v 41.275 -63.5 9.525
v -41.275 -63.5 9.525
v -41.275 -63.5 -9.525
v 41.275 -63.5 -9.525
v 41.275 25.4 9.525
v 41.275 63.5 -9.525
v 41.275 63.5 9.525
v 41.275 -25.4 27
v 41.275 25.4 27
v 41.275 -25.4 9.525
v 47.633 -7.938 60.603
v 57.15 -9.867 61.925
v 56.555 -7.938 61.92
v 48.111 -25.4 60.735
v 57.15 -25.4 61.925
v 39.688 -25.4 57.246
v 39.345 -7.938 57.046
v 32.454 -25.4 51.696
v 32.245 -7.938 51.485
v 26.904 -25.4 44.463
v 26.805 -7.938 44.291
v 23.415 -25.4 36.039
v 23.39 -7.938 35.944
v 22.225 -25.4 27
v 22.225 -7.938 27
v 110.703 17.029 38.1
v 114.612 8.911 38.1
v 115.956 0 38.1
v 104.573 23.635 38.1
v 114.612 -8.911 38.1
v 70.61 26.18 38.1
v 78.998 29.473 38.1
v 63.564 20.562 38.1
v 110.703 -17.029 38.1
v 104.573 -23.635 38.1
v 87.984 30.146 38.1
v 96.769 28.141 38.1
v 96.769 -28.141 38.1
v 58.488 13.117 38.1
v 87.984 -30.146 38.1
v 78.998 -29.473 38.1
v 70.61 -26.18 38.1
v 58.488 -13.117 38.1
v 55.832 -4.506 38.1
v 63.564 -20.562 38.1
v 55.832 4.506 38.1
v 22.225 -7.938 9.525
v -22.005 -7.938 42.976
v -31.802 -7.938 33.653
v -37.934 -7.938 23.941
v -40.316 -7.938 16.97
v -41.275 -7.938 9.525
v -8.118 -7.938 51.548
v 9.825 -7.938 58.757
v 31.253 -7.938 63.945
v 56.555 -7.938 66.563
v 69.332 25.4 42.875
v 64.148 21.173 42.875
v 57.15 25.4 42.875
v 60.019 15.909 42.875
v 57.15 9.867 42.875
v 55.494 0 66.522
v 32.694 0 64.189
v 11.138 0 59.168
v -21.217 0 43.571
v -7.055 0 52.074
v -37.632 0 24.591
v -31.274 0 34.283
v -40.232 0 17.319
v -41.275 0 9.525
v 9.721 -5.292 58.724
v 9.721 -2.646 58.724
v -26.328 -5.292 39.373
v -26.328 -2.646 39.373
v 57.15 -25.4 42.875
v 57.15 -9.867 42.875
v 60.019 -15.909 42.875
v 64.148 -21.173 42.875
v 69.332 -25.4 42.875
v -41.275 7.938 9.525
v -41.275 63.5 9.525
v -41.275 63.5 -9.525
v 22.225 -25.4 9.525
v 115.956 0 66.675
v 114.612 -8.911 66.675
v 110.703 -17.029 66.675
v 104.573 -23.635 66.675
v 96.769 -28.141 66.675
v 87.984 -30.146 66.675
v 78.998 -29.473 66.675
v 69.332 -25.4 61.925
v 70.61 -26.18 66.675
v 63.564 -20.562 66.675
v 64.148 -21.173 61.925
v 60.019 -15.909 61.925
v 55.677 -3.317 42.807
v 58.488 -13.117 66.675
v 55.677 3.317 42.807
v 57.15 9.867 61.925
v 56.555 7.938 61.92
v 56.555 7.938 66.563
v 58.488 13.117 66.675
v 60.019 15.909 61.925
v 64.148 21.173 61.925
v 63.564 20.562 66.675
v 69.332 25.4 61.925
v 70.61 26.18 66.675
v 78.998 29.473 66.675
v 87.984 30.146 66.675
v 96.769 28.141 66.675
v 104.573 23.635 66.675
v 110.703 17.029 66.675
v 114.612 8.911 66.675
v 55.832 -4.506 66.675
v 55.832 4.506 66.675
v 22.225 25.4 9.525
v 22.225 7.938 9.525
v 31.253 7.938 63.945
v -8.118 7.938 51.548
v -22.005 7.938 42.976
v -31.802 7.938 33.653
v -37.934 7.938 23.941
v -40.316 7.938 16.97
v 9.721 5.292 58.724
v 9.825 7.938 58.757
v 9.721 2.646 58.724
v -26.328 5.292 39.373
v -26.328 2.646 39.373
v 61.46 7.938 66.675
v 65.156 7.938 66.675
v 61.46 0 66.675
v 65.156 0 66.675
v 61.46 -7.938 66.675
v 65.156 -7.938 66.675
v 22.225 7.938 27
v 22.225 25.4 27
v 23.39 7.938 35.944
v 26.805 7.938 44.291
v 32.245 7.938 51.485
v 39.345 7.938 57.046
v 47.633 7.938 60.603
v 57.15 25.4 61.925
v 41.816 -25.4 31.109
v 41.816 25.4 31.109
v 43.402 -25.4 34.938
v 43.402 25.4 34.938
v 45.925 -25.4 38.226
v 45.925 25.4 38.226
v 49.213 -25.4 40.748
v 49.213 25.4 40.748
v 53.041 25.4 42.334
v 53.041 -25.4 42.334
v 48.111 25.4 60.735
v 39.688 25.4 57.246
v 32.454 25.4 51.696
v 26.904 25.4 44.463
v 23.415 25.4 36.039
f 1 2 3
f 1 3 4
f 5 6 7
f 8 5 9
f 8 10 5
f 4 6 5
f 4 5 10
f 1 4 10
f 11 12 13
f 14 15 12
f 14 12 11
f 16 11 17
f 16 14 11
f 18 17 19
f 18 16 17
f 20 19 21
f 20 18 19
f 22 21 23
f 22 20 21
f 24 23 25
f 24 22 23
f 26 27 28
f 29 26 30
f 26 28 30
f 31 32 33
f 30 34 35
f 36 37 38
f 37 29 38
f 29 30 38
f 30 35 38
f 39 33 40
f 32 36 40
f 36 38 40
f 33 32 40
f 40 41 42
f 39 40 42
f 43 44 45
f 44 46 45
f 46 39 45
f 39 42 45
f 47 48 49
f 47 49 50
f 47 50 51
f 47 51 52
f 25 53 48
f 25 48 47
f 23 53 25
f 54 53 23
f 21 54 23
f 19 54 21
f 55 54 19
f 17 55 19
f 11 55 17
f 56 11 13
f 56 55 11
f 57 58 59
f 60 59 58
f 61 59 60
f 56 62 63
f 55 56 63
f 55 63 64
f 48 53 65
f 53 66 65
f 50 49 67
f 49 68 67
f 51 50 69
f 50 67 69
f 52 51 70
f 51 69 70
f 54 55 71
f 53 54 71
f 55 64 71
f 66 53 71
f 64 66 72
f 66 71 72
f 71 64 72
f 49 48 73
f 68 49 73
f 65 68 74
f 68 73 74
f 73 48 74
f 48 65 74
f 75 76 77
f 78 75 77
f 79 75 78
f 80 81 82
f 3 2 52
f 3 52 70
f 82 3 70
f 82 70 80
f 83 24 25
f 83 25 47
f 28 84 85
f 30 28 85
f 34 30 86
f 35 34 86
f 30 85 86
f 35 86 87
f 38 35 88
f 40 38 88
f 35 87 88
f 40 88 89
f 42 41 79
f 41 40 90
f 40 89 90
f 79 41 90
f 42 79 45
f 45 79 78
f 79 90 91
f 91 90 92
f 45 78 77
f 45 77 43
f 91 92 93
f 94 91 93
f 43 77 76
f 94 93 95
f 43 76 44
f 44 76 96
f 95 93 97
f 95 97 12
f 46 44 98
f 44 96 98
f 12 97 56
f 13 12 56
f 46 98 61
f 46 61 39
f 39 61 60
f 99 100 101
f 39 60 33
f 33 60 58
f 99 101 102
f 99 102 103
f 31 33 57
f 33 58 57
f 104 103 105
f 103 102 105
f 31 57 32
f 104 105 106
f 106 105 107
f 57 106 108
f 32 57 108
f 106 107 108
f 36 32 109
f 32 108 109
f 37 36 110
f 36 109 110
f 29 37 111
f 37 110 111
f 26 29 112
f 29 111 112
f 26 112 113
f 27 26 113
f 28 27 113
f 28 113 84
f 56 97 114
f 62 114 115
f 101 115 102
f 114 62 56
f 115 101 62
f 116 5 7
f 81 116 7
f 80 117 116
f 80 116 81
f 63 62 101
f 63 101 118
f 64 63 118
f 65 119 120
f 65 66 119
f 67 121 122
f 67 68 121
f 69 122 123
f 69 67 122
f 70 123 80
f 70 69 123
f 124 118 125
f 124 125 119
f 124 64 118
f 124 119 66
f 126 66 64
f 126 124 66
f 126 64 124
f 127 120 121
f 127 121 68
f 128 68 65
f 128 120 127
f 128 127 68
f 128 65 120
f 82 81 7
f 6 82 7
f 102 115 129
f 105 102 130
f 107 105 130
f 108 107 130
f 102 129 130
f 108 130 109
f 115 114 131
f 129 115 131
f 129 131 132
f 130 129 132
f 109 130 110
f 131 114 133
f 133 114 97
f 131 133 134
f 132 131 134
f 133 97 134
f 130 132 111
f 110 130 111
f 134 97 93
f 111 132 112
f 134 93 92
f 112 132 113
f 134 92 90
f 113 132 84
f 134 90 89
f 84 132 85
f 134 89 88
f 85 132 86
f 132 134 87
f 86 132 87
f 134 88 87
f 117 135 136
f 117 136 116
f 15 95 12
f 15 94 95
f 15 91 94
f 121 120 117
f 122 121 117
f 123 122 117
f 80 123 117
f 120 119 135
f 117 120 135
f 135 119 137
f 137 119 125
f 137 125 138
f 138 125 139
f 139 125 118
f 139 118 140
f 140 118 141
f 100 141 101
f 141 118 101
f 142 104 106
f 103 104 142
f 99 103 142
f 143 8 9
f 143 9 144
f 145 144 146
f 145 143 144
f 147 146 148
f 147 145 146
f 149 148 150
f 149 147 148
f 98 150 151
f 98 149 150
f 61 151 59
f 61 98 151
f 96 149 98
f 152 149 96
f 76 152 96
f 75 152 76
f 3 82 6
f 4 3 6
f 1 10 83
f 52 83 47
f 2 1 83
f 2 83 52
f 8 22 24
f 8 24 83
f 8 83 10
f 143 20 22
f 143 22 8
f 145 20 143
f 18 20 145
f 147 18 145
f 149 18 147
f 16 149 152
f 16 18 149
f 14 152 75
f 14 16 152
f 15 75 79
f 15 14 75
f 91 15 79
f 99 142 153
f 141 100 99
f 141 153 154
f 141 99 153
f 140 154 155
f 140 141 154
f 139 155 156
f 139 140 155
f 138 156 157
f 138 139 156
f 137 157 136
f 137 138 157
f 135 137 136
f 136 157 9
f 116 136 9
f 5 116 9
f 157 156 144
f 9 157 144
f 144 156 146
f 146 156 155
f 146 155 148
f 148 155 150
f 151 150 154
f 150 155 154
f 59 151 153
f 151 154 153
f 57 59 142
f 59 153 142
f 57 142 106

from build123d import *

# Parameters (mm, degrees)
F1_DEPTH = 63.5
F0_W     = 20.569474
F0_H     = 19.05
F2_DEPTH = 25.4
F3_DEPTH = 7.9375


with BuildPart() as f1:
    # F0 (on Front) → F1 (new body, symmetric)
    with BuildSketch(Plane.XZ):
        Polygon((22.225, 9.525), (-41.275, 9.525), (-41.275, -9.525), (41.275, -9.525), (41.275, 9.525), align=None)
    extrude(amount=F1_DEPTH, both=True)

    # F0 (on Front) → F2 (join, symmetric)
    with BuildSketch(Plane.XZ):
        with BuildLine():
            Line((22.225, 27.0002), (22.225, 9.525))
            Line((22.225, 9.525), (41.275, 9.525))
            Line((41.275, 9.525), (41.275, 27.0002))
            ThreePointArc((41.275, 27.0002), (45.92468, 38.22552), (57.15, 42.8752))
            Line((57.15, 42.8752), (65.155526, 42.8752))
            Line((65.155526, 42.8752), (65.155526, 61.9252))
            Line((65.155526, 61.9252), (57.15, 61.9252))
            ThreePointArc((57.15, 61.9252), (32.454296, 51.695904), (22.225, 27.0002))
        make_face()
        with Locations((75.440263, 52.4002)):
            Rectangle(F0_W, F0_H)
    extrude(amount=F2_DEPTH, both=True)

    # F0 (on Front) → F3 (join, symmetric)
    with BuildSketch(Plane.XZ):
        with BuildLine():
            add(Edge.make_bspline(
                [(65.155526, 66.675), (13.582303, 67.183912), (-40.261839, 46.325367), (-41.275, 9.525)],
                knots=[0, 0, 0, 0, 120.803888, 120.803888, 120.803888, 120.803888], degree=3))
            Line((-41.275, 9.525), (22.225, 9.525))
            Line((22.225, 9.525), (22.225, 27.0002))
            ThreePointArc((22.225, 27.0002), (32.454296, 51.695904), (57.15, 61.9252))
            Line((57.15, 61.9252), (65.155526, 61.9252))
            Line((65.155526, 61.9252), (65.155526, 66.675))
        make_face()
    extrude(amount=F3_DEPTH, both=True)

    # F0 (on Front) → F4 (revolve)
    with BuildSketch(Plane.XZ):
        Polygon((115.955526, 66.675), (85.725, 66.675), (85.725, 61.9252), (85.725, 42.8752), (85.725, 38.1), (115.955526, 38.1), align=None)
    revolve(axis=Axis((85.725, 0, 40.4876), (0, 0, -1)))


solid = f1.part
